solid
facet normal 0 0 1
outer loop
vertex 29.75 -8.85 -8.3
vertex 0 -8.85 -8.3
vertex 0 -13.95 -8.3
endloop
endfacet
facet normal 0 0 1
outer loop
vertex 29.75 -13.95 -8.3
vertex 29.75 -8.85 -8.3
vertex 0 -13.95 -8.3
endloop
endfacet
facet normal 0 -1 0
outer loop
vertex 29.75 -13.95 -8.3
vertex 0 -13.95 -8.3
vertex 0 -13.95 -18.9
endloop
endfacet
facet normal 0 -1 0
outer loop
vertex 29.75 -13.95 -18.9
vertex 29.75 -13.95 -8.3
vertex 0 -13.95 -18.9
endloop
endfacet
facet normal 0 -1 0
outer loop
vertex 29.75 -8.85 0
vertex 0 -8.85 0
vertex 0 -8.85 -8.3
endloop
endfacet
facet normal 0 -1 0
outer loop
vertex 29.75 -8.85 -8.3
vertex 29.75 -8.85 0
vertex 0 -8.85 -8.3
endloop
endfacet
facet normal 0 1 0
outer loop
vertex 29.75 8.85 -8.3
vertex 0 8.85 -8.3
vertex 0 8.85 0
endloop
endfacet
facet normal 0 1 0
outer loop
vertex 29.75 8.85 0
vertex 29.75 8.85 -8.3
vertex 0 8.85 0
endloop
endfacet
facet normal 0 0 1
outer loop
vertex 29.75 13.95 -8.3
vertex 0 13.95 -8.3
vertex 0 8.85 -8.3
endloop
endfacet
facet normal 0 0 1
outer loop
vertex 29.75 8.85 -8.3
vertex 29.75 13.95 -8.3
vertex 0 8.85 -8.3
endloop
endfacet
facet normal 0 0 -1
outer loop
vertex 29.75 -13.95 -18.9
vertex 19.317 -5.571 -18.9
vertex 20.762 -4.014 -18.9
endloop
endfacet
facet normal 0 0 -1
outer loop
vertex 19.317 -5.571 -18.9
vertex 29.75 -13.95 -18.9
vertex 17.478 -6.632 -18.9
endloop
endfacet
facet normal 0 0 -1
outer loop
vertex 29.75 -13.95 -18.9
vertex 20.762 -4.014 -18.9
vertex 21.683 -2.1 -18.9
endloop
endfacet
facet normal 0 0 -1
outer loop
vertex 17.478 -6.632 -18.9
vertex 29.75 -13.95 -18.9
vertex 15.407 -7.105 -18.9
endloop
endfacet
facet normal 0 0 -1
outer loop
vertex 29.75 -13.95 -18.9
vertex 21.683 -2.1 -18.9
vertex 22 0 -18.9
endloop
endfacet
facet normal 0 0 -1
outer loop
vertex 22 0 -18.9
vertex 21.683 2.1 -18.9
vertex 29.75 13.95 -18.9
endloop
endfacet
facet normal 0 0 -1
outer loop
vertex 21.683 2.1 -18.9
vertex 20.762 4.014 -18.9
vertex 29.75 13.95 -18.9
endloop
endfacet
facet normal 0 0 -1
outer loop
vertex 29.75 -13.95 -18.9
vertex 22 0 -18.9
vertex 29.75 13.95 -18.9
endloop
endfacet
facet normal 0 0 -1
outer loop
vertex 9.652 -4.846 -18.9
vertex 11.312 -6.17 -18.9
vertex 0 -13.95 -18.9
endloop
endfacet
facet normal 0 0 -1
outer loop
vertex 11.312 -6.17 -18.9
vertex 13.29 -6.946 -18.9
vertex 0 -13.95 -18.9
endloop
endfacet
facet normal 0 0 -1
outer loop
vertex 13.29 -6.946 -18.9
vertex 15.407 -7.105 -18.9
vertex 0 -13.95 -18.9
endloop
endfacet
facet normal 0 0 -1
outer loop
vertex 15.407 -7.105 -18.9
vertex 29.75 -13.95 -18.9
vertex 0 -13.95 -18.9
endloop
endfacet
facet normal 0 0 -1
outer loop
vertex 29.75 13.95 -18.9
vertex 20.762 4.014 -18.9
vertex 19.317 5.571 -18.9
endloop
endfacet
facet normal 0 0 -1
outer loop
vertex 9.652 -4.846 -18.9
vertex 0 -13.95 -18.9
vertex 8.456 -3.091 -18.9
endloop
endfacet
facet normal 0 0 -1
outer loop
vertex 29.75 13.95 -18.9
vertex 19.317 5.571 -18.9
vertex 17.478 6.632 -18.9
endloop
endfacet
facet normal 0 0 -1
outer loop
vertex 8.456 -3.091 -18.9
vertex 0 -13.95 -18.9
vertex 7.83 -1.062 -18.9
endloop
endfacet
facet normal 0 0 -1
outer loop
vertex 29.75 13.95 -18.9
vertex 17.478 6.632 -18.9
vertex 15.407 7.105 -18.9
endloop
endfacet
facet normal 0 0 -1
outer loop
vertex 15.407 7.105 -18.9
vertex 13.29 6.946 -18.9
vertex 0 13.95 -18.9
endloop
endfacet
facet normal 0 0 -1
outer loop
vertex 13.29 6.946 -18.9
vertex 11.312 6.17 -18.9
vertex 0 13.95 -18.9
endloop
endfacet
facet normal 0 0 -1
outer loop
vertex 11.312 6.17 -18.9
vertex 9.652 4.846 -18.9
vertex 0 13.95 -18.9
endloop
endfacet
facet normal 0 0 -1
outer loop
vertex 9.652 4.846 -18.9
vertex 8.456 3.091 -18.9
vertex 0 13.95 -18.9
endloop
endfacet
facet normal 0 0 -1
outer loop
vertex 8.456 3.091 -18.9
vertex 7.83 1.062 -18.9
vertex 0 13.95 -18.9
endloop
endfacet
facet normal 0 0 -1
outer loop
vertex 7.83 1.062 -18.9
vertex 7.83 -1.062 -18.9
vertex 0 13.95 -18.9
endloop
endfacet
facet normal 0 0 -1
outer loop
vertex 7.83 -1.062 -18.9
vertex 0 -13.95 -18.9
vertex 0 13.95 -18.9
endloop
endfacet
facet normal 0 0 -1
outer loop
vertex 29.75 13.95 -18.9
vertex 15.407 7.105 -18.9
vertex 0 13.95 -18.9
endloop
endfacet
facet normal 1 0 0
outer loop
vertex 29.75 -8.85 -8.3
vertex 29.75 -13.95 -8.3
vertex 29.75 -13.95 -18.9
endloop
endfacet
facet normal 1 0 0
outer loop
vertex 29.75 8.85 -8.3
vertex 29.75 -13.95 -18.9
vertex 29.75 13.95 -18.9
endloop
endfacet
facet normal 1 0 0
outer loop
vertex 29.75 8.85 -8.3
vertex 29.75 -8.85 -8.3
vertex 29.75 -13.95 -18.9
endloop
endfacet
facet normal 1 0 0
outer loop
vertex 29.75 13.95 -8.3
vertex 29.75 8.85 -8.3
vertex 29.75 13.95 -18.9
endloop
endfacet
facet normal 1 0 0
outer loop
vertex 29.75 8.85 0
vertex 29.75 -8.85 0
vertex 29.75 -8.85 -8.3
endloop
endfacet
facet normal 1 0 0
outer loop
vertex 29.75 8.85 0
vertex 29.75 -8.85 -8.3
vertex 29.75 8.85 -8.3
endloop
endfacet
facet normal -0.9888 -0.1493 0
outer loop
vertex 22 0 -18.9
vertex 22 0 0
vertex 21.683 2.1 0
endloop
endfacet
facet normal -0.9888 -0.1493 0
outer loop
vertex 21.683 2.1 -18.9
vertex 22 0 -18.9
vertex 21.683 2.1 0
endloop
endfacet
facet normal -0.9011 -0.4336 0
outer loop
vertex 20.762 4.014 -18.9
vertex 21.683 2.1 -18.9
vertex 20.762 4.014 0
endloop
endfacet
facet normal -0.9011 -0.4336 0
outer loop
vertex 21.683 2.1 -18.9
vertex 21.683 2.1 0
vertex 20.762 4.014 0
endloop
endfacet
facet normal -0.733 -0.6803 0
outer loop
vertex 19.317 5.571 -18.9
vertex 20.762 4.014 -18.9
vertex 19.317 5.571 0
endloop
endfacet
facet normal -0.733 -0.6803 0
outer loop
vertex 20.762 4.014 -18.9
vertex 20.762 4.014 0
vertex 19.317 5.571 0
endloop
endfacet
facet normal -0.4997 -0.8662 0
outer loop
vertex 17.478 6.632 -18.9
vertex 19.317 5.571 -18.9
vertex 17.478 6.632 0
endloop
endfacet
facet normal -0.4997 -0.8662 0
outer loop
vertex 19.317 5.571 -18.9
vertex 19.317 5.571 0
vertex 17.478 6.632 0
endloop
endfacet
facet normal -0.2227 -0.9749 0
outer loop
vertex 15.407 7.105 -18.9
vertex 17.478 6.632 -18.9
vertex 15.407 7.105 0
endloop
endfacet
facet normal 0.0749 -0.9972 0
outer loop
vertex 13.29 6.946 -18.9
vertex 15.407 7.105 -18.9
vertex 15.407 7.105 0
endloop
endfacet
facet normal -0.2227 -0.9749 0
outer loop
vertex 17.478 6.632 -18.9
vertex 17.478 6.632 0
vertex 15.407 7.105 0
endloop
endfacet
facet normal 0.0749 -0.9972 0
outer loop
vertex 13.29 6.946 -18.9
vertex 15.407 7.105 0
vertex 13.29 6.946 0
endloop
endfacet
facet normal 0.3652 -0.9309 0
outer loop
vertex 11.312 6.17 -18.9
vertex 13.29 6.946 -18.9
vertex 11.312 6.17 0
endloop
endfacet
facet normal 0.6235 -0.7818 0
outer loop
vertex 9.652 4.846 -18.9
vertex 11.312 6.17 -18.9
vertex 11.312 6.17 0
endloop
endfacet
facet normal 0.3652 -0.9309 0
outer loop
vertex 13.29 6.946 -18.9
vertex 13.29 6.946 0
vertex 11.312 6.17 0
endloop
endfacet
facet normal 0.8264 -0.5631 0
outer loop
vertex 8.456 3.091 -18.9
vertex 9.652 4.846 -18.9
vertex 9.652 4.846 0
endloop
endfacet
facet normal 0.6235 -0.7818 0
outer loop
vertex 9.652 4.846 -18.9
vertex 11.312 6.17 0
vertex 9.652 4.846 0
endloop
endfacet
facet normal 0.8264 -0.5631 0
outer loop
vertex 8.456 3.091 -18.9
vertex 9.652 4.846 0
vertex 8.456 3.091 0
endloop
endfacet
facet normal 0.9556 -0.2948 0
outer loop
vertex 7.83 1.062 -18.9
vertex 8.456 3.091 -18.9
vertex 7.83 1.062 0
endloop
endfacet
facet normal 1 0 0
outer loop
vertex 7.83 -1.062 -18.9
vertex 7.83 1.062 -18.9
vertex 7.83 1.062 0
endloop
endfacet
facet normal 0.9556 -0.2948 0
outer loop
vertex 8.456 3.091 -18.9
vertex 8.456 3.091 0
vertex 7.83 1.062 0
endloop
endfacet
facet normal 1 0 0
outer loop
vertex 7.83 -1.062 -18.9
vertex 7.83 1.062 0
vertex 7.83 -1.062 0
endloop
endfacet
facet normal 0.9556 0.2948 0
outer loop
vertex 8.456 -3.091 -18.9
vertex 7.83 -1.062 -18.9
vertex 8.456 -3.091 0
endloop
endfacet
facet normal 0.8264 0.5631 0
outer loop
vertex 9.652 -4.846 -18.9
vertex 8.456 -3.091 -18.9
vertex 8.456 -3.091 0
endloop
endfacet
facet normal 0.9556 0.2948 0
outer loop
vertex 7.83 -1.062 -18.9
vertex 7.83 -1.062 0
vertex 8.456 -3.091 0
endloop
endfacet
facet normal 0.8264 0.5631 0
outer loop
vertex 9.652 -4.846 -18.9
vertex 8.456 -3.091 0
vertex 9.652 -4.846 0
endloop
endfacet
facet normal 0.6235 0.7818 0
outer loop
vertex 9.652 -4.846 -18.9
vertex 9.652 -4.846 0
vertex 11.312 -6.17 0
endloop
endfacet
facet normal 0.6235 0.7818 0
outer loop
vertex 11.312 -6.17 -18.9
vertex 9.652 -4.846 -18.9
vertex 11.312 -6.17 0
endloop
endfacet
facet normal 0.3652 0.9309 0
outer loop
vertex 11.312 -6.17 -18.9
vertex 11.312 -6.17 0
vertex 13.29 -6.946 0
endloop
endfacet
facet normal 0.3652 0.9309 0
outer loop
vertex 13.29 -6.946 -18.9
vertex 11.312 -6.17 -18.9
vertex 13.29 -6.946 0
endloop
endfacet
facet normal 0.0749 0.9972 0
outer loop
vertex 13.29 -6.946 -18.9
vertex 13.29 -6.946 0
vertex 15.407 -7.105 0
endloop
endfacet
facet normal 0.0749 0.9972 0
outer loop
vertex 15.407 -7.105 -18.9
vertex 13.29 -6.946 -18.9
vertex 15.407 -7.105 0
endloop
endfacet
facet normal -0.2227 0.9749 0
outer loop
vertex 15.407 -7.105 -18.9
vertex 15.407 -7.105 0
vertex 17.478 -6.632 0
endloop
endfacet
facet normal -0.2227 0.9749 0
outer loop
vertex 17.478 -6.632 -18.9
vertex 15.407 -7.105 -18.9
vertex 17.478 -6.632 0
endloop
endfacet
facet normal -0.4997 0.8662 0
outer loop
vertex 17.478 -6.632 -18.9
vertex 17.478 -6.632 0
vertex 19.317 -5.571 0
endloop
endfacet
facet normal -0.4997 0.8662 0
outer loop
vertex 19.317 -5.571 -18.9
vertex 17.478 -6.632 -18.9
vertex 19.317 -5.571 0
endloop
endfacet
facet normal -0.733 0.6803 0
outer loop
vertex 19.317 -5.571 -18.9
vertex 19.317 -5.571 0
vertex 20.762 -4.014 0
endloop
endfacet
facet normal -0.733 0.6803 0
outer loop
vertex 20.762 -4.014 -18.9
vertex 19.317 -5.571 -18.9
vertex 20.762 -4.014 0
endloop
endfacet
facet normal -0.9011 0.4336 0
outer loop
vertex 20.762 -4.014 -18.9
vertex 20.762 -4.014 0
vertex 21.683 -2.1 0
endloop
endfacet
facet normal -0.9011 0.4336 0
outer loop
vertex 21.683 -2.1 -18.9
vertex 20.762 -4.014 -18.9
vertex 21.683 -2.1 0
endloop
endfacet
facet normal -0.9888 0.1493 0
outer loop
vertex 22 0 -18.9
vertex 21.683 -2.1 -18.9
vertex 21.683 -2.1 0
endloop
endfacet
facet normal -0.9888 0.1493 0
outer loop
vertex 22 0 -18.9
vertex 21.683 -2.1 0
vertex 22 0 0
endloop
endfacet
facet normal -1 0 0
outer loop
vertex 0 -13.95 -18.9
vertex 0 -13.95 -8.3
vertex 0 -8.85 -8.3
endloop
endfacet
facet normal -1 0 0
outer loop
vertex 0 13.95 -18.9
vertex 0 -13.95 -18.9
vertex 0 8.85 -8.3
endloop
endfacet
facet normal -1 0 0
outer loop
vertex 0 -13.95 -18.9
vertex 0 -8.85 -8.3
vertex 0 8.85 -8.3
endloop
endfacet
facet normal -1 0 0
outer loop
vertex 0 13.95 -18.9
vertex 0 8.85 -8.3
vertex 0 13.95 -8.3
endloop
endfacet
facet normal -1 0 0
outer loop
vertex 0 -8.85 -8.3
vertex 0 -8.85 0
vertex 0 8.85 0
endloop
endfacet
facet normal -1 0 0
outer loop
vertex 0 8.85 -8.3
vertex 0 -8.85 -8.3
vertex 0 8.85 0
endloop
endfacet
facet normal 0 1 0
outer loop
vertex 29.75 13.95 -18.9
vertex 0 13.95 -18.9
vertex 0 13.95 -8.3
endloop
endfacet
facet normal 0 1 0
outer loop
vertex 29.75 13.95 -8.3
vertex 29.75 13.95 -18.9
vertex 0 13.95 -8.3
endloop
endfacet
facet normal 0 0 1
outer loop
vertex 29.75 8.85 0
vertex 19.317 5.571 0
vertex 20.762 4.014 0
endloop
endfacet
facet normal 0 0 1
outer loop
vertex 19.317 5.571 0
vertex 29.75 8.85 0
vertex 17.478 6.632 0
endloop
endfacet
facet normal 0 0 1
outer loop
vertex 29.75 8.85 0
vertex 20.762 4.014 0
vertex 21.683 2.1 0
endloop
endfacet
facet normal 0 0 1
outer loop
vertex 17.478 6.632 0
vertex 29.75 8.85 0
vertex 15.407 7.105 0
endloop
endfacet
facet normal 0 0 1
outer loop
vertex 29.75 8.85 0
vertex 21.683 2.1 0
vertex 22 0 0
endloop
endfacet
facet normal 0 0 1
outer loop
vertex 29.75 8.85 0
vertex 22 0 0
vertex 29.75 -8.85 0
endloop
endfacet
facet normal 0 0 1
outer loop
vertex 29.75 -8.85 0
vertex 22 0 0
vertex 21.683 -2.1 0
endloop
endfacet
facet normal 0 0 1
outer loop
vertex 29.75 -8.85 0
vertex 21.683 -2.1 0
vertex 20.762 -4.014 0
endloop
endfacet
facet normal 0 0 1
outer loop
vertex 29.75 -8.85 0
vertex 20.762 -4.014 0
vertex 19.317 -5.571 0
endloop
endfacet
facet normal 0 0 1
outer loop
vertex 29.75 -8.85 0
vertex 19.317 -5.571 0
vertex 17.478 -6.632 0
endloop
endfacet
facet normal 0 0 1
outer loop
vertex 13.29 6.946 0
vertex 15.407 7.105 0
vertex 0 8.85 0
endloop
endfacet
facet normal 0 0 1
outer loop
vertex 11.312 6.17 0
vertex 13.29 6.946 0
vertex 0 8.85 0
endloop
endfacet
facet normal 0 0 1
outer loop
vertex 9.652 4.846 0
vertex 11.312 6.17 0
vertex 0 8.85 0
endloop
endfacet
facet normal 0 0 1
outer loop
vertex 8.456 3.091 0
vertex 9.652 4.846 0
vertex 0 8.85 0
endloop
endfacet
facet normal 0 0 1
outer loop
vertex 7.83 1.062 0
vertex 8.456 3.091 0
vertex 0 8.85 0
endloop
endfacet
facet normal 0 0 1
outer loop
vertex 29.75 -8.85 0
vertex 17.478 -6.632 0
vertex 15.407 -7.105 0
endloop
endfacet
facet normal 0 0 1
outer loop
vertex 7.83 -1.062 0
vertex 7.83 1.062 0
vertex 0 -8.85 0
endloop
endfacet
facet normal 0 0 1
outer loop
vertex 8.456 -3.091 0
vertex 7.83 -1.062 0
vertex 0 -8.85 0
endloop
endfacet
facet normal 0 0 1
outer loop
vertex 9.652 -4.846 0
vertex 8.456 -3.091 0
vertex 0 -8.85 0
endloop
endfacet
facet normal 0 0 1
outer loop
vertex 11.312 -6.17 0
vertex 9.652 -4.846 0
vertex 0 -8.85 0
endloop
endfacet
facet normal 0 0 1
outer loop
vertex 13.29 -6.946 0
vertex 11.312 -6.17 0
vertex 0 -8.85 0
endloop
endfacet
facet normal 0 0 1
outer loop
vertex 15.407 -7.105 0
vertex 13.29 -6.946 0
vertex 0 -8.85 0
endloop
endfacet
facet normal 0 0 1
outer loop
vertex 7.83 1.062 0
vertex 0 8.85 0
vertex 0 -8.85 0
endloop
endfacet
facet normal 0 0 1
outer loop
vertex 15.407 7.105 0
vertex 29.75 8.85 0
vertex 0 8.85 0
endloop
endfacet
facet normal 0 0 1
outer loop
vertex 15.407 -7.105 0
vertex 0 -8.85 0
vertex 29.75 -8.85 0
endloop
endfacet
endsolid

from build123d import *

# Parameters (mm, degrees)
F1_DEPTH = 29.75
F2_R     = 7.125
F3_DEPTH = 18.901


with BuildPart() as f1:
    # F0 (on Right) → F1 (new body)
    with BuildSketch(Plane.YZ):
        Polygon((8.85, 0), (-8.85, 0), (-8.85, -8.3), (-13.95, -8.3), (-13.95, -18.9), (13.95, -18.9), (13.95, -8.3), (8.85, -8.3), align=None)
    extrude(amount=F1_DEPTH)

    # F2 (on face) → F3 (cut, through all)
    with BuildSketch(Plane.XY):
        with Locations((14.875, 0)):
            Circle(F2_R)
    extrude(amount=-F3_DEPTH, mode=Mode.SUBTRACT)


solid = f1.part
